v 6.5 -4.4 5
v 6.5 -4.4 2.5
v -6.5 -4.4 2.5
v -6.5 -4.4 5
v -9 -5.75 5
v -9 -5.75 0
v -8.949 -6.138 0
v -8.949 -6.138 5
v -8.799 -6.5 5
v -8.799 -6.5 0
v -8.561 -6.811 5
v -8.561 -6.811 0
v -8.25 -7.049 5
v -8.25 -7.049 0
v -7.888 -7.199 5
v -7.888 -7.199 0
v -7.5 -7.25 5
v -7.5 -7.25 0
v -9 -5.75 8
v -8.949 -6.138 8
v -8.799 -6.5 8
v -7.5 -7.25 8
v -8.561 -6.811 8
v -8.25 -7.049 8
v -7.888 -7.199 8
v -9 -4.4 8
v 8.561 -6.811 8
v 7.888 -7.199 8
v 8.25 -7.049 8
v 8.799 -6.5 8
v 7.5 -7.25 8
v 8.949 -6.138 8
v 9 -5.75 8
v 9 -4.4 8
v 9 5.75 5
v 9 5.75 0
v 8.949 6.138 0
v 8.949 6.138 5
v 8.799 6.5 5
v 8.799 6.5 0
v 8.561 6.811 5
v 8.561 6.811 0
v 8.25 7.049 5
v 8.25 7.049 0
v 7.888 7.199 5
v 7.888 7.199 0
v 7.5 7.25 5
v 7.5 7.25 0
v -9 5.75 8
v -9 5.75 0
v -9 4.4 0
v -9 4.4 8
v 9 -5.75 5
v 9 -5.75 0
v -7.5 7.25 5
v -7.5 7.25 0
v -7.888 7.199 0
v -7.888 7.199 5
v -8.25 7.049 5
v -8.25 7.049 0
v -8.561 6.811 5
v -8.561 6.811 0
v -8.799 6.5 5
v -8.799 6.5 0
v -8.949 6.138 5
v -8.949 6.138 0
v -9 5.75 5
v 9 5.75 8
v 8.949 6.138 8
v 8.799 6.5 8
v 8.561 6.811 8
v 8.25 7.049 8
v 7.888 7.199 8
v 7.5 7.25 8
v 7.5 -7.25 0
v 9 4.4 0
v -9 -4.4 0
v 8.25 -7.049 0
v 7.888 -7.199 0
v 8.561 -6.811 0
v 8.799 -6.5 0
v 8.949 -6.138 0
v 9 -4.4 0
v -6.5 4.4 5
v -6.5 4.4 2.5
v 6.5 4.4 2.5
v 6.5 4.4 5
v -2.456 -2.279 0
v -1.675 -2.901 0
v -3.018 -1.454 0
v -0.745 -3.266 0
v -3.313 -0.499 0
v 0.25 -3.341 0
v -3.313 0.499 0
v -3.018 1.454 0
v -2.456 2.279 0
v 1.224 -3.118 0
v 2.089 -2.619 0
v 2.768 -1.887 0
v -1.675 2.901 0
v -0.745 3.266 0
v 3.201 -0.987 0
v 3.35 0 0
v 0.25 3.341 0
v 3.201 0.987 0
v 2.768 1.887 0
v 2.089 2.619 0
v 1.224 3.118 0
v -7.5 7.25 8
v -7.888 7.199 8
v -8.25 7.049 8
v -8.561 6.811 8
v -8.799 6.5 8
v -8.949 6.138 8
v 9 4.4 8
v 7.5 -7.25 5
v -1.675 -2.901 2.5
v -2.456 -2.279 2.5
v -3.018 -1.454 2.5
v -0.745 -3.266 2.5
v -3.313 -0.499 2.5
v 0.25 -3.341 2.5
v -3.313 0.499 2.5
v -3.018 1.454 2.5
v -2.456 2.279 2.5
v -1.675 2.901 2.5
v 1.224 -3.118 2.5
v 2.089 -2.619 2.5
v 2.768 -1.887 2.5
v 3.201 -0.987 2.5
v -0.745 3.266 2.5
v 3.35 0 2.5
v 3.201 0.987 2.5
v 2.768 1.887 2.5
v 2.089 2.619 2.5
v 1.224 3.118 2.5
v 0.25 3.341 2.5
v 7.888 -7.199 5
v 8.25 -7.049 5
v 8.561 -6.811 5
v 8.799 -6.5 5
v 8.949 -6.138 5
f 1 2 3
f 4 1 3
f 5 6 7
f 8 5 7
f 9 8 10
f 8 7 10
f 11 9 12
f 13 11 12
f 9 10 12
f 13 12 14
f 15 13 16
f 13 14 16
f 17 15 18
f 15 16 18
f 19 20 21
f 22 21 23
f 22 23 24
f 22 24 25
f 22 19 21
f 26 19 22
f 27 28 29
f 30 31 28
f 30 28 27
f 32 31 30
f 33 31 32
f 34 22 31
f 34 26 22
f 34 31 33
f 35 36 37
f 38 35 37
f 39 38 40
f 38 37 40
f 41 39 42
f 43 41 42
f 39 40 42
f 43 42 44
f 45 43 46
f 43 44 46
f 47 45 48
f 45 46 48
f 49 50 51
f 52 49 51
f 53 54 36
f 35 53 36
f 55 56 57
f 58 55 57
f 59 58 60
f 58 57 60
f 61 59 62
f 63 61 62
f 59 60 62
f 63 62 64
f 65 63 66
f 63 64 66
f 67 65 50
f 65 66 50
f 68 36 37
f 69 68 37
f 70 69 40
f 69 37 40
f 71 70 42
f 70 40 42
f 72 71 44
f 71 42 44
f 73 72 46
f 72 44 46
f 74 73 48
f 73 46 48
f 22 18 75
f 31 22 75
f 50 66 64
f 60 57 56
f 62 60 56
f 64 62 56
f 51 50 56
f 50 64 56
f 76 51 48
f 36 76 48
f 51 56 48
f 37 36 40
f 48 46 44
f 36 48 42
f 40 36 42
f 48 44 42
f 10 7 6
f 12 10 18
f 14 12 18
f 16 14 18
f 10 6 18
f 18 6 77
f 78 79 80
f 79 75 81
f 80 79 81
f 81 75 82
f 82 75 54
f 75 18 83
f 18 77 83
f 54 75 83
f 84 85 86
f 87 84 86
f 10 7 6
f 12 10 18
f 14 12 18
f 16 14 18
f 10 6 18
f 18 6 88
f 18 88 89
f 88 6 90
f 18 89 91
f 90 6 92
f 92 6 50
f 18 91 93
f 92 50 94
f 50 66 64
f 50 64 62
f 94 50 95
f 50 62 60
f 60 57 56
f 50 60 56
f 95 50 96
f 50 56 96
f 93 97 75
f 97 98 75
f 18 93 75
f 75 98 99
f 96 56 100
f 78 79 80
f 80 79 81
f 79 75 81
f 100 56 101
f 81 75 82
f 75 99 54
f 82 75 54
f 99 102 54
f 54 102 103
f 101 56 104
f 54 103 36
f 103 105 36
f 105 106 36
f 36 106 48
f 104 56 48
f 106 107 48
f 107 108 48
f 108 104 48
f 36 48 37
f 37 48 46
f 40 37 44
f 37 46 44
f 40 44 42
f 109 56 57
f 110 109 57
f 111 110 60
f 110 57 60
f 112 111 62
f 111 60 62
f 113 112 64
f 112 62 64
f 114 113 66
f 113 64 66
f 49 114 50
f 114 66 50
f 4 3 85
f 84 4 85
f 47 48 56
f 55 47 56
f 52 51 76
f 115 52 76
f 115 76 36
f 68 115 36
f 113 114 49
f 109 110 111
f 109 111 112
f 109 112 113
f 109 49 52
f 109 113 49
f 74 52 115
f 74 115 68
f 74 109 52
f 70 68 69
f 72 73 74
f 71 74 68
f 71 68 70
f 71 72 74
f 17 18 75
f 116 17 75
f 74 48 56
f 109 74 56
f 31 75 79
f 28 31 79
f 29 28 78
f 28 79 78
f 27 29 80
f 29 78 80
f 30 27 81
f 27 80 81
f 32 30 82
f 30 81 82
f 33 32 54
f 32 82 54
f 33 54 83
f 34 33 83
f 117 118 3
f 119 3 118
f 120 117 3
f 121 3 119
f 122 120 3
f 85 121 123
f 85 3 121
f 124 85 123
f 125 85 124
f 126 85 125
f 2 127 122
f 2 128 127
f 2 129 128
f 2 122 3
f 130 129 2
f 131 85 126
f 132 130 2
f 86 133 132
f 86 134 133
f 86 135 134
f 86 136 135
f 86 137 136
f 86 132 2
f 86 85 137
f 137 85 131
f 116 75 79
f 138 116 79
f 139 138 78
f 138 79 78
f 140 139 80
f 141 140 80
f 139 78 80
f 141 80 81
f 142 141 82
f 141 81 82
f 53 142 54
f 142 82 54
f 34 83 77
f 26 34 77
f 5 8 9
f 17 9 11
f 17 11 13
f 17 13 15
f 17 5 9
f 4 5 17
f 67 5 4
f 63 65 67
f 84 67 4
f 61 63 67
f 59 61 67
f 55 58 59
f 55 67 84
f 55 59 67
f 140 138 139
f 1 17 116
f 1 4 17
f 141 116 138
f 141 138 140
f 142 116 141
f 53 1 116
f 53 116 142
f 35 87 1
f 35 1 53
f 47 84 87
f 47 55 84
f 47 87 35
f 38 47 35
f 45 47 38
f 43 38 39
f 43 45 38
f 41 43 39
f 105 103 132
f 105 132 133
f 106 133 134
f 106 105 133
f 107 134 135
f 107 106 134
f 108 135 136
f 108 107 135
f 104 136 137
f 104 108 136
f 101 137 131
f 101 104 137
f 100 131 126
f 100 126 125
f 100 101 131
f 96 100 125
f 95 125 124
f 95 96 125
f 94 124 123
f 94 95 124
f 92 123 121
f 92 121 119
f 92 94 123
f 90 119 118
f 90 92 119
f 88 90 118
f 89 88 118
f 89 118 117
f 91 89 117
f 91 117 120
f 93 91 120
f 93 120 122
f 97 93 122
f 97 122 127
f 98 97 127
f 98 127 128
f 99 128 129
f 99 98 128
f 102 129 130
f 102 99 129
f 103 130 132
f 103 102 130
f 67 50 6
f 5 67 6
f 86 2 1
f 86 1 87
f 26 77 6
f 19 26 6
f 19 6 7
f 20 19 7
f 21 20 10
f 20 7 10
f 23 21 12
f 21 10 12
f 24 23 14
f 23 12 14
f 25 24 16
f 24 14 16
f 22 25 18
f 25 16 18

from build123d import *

# Parameters (mm, degrees)
F0_W     = 13
F0_H     = 8.8
F0_R     = 3.35
F1_DEPTH = 2.5
F0_W_2   = 2.5
F2_DEPTH = 5
F3_DEPTH = 8


with BuildPart() as f1:
    # F0 (on Top) → F1 (new body)
    with BuildSketch(Plane.XY):
        Rectangle(F0_W, F0_H)
        Circle(F0_R, mode=Mode.SUBTRACT)
    extrude(amount=F1_DEPTH)

    # F0 (on Top) → F2 (join)
    with BuildSketch(Plane.XY):
        with BuildLine():
            Line((7.5, 7.25), (-7.5, 7.25))
            ThreePointArc((-7.5, 7.25), (-8.56066, 6.81066), (-9, 5.75))
            Line((-9, 5.75), (-9, 4.4))
            Line((-9, 4.4), (-6.5, 4.4))
            Line((-6.5, 4.4), (6.5, 4.4))
            Line((6.5, 4.4), (9, 4.4))
            Line((9, 4.4), (9, 5.75))
            ThreePointArc((9, 5.75), (8.56066, 6.81066), (7.5, 7.25))
        make_face()
        with Locations((-7.75, 0)):
            Rectangle(F0_W_2, F0_H)
        with Locations((7.75, 0)):
            Rectangle(F0_W_2, F0_H)
        with BuildLine():
            Line((-6.5, -4.4), (-9, -4.4))
            Line((-9, -4.4), (-9, -5.75))
            ThreePointArc((-9, -5.75), (-8.56066, -6.81066), (-7.5, -7.25))
            Line((-7.5, -7.25), (7.5, -7.25))
            ThreePointArc((7.5, -7.25), (8.56066, -6.81066), (9, -5.75))
            Line((9, -5.75), (9, -4.4))
            Line((9, -4.4), (6.5, -4.4))
            Line((6.5, -4.4), (-6.5, -4.4))
        make_face()
    extrude(amount=F2_DEPTH)


with BuildPart() as f3:
    # F0 (on Top) → F3 (new body)
    with BuildSketch(Plane.XY):
        with BuildLine():
            Line((7.5, 7.25), (-7.5, 7.25))
            ThreePointArc((-7.5, 7.25), (-8.56066, 6.81066), (-9, 5.75))
            Line((-9, 5.75), (-9, 4.4))
            Line((-9, 4.4), (-6.5, 4.4))
            Line((-6.5, 4.4), (6.5, 4.4))
            Line((6.5, 4.4), (9, 4.4))
            Line((9, 4.4), (9, 5.75))
            ThreePointArc((9, 5.75), (8.56066, 6.81066), (7.5, 7.25))
        make_face()
        with BuildLine():
            Line((-6.5, -4.4), (-9, -4.4))
            Line((-9, -4.4), (-9, -5.75))
            ThreePointArc((-9, -5.75), (-8.56066, -6.81066), (-7.5, -7.25))
            Line((-7.5, -7.25), (7.5, -7.25))
            ThreePointArc((7.5, -7.25), (8.56066, -6.81066), (9, -5.75))
            Line((9, -5.75), (9, -4.4))
            Line((9, -4.4), (6.5, -4.4))
            Line((6.5, -4.4), (-6.5, -4.4))
        make_face()
    extrude(amount=F3_DEPTH)


solid = Compound([f1.part, f3.part])
